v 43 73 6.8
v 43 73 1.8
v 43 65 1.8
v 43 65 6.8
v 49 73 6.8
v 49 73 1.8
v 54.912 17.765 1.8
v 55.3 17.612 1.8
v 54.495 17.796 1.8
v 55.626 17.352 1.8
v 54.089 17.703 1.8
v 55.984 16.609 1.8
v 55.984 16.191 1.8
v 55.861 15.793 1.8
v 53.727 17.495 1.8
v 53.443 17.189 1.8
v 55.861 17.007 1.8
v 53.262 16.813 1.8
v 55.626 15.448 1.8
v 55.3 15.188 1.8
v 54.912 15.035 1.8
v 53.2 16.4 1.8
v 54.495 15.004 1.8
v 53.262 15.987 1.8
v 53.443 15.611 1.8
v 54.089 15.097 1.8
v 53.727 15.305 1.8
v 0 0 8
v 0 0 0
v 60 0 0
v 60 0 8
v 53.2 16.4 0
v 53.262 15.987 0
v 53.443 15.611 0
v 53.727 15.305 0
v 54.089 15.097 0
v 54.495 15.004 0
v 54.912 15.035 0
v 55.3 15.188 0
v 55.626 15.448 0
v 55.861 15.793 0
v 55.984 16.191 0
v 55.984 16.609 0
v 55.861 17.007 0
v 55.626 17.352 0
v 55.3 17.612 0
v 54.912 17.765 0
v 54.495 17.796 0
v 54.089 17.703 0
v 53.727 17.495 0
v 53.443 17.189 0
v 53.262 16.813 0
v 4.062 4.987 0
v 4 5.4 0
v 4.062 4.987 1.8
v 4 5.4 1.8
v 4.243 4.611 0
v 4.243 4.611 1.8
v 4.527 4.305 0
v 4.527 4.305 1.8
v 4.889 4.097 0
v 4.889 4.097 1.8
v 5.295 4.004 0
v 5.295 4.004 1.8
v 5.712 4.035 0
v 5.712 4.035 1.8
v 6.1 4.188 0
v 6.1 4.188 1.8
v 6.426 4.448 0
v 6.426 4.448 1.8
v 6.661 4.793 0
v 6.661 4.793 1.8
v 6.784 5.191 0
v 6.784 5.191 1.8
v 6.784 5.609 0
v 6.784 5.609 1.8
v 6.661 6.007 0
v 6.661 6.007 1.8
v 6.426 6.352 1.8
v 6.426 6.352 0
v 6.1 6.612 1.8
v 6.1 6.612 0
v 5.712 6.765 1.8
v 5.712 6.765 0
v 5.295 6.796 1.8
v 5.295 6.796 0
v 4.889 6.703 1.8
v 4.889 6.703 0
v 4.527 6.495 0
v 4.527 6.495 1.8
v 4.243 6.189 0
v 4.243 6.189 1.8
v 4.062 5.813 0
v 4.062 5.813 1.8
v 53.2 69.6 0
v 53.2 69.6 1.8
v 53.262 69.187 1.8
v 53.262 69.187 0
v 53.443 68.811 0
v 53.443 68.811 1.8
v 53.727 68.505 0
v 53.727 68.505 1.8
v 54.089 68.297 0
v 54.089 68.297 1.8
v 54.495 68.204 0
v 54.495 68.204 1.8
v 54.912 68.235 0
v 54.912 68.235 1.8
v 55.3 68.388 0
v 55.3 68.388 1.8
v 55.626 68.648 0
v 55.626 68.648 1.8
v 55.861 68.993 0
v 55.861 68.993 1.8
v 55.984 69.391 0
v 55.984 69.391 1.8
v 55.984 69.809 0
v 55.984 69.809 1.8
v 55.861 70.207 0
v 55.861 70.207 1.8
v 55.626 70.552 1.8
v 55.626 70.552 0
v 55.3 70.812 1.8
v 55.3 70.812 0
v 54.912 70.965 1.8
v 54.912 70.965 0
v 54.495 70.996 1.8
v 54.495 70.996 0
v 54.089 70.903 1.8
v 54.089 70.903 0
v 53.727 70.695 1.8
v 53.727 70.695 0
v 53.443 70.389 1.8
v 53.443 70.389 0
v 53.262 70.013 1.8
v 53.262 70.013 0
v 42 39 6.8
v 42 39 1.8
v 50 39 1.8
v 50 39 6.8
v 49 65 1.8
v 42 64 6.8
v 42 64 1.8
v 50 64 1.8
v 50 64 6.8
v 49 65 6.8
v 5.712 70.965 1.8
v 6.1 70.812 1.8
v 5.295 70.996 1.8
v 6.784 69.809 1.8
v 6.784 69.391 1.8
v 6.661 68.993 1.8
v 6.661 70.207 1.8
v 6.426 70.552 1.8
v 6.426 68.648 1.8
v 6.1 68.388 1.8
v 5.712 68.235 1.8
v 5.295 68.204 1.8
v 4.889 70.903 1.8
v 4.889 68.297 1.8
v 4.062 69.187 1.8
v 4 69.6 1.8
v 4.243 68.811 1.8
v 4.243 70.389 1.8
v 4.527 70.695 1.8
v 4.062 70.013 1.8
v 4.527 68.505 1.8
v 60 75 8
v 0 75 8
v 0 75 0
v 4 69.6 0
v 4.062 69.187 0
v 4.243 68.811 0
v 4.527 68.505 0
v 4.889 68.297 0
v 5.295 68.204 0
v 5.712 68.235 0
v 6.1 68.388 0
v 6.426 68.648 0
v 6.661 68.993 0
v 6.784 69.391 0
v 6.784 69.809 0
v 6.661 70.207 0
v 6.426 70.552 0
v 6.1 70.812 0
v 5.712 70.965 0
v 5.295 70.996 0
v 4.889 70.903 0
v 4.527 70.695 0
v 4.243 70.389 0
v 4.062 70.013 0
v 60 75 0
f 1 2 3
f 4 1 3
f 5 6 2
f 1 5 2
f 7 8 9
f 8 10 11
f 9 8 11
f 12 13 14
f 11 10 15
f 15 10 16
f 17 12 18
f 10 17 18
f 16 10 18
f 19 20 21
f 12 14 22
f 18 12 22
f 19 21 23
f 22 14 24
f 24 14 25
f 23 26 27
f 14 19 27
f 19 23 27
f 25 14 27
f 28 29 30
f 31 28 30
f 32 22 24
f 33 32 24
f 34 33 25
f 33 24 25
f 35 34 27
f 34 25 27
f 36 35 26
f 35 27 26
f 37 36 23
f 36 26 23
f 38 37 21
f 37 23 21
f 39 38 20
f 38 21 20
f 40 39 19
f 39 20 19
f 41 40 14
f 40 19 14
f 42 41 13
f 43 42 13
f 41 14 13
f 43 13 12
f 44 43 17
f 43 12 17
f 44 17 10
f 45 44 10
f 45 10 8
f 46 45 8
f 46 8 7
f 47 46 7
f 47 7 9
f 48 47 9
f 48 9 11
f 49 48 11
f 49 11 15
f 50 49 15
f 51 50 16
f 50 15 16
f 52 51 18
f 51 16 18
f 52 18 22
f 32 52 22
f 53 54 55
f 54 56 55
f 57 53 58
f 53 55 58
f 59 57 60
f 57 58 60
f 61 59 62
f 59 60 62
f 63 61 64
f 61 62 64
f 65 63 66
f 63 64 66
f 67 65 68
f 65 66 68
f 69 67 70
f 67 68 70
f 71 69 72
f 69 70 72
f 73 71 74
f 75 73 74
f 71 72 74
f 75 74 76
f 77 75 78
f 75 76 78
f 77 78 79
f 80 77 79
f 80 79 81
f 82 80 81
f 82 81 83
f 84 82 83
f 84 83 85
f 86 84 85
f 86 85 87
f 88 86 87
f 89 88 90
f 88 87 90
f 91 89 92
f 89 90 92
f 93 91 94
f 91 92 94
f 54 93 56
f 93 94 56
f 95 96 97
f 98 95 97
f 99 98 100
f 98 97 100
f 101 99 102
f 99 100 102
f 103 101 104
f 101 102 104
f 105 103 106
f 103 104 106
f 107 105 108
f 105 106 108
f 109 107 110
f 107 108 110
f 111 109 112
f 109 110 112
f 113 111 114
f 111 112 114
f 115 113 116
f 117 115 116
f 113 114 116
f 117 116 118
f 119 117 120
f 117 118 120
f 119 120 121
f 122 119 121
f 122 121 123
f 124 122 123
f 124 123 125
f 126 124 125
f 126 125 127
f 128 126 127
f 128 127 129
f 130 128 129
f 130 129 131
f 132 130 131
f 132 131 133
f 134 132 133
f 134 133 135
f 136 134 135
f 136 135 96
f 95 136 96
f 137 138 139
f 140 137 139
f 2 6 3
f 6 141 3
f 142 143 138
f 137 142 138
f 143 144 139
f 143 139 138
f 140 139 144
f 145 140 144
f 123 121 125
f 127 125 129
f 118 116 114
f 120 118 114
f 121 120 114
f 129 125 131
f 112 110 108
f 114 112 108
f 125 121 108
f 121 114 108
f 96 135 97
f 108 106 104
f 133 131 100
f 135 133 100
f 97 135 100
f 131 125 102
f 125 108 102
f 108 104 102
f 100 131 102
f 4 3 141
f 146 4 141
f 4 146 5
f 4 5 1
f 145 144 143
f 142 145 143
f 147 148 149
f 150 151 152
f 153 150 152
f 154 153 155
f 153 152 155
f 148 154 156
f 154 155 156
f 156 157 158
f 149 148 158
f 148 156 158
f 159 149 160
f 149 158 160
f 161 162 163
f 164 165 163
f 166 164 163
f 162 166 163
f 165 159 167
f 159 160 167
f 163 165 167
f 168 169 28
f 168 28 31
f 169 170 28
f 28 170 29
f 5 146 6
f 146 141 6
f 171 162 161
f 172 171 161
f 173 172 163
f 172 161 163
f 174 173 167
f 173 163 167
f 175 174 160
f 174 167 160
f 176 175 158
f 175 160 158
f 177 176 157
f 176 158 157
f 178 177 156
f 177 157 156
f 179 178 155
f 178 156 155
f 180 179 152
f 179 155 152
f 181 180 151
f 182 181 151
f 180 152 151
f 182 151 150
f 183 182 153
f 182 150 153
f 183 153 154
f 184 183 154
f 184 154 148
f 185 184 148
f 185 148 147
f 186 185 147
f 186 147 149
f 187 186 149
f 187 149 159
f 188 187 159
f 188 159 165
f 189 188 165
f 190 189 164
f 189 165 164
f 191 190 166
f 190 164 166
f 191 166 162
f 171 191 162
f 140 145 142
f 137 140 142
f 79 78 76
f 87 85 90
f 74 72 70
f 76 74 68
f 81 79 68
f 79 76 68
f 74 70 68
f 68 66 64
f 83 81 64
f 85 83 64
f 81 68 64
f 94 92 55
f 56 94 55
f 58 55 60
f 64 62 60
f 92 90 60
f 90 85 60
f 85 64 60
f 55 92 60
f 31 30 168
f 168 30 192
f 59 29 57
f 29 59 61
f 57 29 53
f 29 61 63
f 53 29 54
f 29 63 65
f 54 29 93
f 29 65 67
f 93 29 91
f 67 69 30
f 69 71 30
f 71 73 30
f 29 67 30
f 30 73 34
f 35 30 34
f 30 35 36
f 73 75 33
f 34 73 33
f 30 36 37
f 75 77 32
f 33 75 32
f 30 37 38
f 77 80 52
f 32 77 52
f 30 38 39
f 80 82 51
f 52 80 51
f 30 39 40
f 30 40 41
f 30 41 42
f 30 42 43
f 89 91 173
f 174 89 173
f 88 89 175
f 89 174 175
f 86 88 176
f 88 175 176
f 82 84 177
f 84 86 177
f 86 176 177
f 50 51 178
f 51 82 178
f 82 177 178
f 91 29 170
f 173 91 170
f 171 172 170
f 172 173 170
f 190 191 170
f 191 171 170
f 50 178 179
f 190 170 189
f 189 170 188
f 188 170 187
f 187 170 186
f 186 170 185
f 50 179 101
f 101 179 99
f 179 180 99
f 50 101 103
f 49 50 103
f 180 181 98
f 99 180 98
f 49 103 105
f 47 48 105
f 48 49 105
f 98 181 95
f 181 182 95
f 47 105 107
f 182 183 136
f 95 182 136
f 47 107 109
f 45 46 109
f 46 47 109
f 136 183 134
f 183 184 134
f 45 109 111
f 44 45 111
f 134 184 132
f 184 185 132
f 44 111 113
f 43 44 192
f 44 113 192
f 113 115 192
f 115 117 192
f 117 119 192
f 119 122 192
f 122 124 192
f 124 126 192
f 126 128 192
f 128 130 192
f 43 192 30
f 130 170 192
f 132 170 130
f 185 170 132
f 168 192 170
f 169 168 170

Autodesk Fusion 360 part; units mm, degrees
sketch "Sketch1" plane through (0, 0, 0) normal (0, 0, 1) x (1, 0, 0)
  circle A0 centre (10, 10) radius 2.5
  circle A1 centre (10, 10) radius 1.4
  dimension "d1" = 5
  dimension "d2" = 2.8
extrude "Extrude1" add sketch "Sketch1" along normal blind 8

Autodesk Fusion 360 part; units mm, degrees
sketch "Sketch1" plane through (0, 0, 0) normal (0, 0, 1) x (1, 0, 0)
  line L0 (0, 0) -> (60, 0)
  line L1 (60, 0) -> (60, 75)
  line L2 (60, 75) -> (0, 75)
  line L3 (0, 75) -> (0, 0)
  dimension "d1" = 60
  dimension "d2" = 75
extrude "Extrude1" add sketch "Sketch1" along normal blind 1.8
sketch "Sketch2" plane through (0, 75, 0) normal (0, 1, 0) x (-1, 0, 0)
  line L0 (-60, 0) -> (0, 0)
  line L1 (0, 0) -> (0, 1.8)
  line L2 (0, 1.8) -> (-60, 1.8)
  line L3 (-60, 1.8) -> (-60, 0)
sketch "Sketch3" plane through (0, 0, 1.8) normal (0, 0, 1) x (-1, 0, 0)
  line L0 (0, -75) -> (0, 0)
  line L1 (0, 0) -> (-60, 0)
  line L2 (-60, 0) -> (-60, -75)
  line L3 (-60, -75) -> (0, -75)
  line L4 (-56, 0) -> (-46, 0)
  line L5 (-46, 0) -> (-46, -11)
  line L6 (-46, -11) -> (-56, -11)
  line L7 (-56, -11) -> (-56, 0)
  dimension "d19" = 10
  dimension "d20" = 11
  dimension "d21" = 4
extrude "Extrude2" add sketch "Sketch3" along normal blind 2.6 contours L1 L4 L5 L6 L7
sketch "Sketch4" plane through (0, 0, 1.8) normal (0, 0, 1) x (-1, 0, 0)
  line L0 (-56, 0) -> (-60, 0)
  line L1 (-60, 0) -> (-60, -75)
  line L2 (-60, -75) -> (0, -75)
  line L3 (0, -75) -> (0, 0)
  line L4 (0, 0) -> (-46, 0)
  circle A0 centre (-5.4, -69.6) radius 1.4
  line L5 (0, -75) -> (-60, -75)
  circle A1 centre (-54.6, -69.6) radius 1.4
  circle A2 centre (-54.6, -16.4) radius 1.4
  circle A3 centre (-5.4, -5.4) radius 1.4
  line L6 (-46, 0) -> (-46, -11)
  line L7 (-46, -11) -> (-56, -11)
  line L8 (-56, -11) -> (-56, 0)
  line L9 (-46, 0) -> (-56, 0)
  dimension "d7" = 2.8
  dimension "d8" = 5.4
  dimension "d9" = 5.4
  dimension "d10" = 2.8
  dimension "d11" = 2.8
  dimension "d12" = 2.8
  dimension "d13" = 5.4
  dimension "d14" = 5.4
  dimension "d31" = 5.4
  dimension "d32" = 5.4
  dimension "d33" = 5.4
  dimension "d34" = 16.4
extrude "Extrude3" cut sketch "Sketch4" against normal blind 3 contours A0 | A1 | A2 | A3
sketch "Sketch5" plane through (0, 0, 1.8) normal (0, 0, 1) x (-1, 0, 0)
  circle A0 centre (-54.6, -16.4) radius 1.4
  circle A1 centre (-5.4, -5.4) radius 1.4
  circle A2 centre (-54.6, -69.6) radius 1.4
  circle A3 centre (-5.4, -69.6) radius 1.4
  line L0 (-56, 0) -> (-60, 0)
  line L1 (-60, 0) -> (-60, -75)
  line L2 (-60, -75) -> (0, -75)
  line L3 (0, -75) -> (0, 0)
  line L4 (0, 0) -> (-46, 0)
  line L5 (-46, 0) -> (-46, -11)
  line L6 (-46, -11) -> (-56, -11)
  line L7 (-56, -11) -> (-56, 0)
  line L8 (-49, -73) -> (-43, -73)
  line L9 (-43, -73) -> (-43, -65)
  line L10 (-43, -65) -> (-49, -65)
  line L11 (-49, -65) -> (-49, -73)
  line L12 (-50, -64) -> (-42, -64)
  line L13 (-42, -64) -> (-42, -39)
  line L14 (-42, -39) -> (-50, -39)
  line L15 (-50, -39) -> (-50, -64)
  dimension "d22" = 6
  dimension "d23" = 8
  dimension "d24" = 11
  dimension "d25" = 8
  dimension "d26" = 25
  dimension "d27" = 10
  dimension "d28" = 11
extrude "Extrude5" add sketch "Sketch5" along normal blind 5 contours L8 L9 L10 L11 | L12 L13 L14 L15
